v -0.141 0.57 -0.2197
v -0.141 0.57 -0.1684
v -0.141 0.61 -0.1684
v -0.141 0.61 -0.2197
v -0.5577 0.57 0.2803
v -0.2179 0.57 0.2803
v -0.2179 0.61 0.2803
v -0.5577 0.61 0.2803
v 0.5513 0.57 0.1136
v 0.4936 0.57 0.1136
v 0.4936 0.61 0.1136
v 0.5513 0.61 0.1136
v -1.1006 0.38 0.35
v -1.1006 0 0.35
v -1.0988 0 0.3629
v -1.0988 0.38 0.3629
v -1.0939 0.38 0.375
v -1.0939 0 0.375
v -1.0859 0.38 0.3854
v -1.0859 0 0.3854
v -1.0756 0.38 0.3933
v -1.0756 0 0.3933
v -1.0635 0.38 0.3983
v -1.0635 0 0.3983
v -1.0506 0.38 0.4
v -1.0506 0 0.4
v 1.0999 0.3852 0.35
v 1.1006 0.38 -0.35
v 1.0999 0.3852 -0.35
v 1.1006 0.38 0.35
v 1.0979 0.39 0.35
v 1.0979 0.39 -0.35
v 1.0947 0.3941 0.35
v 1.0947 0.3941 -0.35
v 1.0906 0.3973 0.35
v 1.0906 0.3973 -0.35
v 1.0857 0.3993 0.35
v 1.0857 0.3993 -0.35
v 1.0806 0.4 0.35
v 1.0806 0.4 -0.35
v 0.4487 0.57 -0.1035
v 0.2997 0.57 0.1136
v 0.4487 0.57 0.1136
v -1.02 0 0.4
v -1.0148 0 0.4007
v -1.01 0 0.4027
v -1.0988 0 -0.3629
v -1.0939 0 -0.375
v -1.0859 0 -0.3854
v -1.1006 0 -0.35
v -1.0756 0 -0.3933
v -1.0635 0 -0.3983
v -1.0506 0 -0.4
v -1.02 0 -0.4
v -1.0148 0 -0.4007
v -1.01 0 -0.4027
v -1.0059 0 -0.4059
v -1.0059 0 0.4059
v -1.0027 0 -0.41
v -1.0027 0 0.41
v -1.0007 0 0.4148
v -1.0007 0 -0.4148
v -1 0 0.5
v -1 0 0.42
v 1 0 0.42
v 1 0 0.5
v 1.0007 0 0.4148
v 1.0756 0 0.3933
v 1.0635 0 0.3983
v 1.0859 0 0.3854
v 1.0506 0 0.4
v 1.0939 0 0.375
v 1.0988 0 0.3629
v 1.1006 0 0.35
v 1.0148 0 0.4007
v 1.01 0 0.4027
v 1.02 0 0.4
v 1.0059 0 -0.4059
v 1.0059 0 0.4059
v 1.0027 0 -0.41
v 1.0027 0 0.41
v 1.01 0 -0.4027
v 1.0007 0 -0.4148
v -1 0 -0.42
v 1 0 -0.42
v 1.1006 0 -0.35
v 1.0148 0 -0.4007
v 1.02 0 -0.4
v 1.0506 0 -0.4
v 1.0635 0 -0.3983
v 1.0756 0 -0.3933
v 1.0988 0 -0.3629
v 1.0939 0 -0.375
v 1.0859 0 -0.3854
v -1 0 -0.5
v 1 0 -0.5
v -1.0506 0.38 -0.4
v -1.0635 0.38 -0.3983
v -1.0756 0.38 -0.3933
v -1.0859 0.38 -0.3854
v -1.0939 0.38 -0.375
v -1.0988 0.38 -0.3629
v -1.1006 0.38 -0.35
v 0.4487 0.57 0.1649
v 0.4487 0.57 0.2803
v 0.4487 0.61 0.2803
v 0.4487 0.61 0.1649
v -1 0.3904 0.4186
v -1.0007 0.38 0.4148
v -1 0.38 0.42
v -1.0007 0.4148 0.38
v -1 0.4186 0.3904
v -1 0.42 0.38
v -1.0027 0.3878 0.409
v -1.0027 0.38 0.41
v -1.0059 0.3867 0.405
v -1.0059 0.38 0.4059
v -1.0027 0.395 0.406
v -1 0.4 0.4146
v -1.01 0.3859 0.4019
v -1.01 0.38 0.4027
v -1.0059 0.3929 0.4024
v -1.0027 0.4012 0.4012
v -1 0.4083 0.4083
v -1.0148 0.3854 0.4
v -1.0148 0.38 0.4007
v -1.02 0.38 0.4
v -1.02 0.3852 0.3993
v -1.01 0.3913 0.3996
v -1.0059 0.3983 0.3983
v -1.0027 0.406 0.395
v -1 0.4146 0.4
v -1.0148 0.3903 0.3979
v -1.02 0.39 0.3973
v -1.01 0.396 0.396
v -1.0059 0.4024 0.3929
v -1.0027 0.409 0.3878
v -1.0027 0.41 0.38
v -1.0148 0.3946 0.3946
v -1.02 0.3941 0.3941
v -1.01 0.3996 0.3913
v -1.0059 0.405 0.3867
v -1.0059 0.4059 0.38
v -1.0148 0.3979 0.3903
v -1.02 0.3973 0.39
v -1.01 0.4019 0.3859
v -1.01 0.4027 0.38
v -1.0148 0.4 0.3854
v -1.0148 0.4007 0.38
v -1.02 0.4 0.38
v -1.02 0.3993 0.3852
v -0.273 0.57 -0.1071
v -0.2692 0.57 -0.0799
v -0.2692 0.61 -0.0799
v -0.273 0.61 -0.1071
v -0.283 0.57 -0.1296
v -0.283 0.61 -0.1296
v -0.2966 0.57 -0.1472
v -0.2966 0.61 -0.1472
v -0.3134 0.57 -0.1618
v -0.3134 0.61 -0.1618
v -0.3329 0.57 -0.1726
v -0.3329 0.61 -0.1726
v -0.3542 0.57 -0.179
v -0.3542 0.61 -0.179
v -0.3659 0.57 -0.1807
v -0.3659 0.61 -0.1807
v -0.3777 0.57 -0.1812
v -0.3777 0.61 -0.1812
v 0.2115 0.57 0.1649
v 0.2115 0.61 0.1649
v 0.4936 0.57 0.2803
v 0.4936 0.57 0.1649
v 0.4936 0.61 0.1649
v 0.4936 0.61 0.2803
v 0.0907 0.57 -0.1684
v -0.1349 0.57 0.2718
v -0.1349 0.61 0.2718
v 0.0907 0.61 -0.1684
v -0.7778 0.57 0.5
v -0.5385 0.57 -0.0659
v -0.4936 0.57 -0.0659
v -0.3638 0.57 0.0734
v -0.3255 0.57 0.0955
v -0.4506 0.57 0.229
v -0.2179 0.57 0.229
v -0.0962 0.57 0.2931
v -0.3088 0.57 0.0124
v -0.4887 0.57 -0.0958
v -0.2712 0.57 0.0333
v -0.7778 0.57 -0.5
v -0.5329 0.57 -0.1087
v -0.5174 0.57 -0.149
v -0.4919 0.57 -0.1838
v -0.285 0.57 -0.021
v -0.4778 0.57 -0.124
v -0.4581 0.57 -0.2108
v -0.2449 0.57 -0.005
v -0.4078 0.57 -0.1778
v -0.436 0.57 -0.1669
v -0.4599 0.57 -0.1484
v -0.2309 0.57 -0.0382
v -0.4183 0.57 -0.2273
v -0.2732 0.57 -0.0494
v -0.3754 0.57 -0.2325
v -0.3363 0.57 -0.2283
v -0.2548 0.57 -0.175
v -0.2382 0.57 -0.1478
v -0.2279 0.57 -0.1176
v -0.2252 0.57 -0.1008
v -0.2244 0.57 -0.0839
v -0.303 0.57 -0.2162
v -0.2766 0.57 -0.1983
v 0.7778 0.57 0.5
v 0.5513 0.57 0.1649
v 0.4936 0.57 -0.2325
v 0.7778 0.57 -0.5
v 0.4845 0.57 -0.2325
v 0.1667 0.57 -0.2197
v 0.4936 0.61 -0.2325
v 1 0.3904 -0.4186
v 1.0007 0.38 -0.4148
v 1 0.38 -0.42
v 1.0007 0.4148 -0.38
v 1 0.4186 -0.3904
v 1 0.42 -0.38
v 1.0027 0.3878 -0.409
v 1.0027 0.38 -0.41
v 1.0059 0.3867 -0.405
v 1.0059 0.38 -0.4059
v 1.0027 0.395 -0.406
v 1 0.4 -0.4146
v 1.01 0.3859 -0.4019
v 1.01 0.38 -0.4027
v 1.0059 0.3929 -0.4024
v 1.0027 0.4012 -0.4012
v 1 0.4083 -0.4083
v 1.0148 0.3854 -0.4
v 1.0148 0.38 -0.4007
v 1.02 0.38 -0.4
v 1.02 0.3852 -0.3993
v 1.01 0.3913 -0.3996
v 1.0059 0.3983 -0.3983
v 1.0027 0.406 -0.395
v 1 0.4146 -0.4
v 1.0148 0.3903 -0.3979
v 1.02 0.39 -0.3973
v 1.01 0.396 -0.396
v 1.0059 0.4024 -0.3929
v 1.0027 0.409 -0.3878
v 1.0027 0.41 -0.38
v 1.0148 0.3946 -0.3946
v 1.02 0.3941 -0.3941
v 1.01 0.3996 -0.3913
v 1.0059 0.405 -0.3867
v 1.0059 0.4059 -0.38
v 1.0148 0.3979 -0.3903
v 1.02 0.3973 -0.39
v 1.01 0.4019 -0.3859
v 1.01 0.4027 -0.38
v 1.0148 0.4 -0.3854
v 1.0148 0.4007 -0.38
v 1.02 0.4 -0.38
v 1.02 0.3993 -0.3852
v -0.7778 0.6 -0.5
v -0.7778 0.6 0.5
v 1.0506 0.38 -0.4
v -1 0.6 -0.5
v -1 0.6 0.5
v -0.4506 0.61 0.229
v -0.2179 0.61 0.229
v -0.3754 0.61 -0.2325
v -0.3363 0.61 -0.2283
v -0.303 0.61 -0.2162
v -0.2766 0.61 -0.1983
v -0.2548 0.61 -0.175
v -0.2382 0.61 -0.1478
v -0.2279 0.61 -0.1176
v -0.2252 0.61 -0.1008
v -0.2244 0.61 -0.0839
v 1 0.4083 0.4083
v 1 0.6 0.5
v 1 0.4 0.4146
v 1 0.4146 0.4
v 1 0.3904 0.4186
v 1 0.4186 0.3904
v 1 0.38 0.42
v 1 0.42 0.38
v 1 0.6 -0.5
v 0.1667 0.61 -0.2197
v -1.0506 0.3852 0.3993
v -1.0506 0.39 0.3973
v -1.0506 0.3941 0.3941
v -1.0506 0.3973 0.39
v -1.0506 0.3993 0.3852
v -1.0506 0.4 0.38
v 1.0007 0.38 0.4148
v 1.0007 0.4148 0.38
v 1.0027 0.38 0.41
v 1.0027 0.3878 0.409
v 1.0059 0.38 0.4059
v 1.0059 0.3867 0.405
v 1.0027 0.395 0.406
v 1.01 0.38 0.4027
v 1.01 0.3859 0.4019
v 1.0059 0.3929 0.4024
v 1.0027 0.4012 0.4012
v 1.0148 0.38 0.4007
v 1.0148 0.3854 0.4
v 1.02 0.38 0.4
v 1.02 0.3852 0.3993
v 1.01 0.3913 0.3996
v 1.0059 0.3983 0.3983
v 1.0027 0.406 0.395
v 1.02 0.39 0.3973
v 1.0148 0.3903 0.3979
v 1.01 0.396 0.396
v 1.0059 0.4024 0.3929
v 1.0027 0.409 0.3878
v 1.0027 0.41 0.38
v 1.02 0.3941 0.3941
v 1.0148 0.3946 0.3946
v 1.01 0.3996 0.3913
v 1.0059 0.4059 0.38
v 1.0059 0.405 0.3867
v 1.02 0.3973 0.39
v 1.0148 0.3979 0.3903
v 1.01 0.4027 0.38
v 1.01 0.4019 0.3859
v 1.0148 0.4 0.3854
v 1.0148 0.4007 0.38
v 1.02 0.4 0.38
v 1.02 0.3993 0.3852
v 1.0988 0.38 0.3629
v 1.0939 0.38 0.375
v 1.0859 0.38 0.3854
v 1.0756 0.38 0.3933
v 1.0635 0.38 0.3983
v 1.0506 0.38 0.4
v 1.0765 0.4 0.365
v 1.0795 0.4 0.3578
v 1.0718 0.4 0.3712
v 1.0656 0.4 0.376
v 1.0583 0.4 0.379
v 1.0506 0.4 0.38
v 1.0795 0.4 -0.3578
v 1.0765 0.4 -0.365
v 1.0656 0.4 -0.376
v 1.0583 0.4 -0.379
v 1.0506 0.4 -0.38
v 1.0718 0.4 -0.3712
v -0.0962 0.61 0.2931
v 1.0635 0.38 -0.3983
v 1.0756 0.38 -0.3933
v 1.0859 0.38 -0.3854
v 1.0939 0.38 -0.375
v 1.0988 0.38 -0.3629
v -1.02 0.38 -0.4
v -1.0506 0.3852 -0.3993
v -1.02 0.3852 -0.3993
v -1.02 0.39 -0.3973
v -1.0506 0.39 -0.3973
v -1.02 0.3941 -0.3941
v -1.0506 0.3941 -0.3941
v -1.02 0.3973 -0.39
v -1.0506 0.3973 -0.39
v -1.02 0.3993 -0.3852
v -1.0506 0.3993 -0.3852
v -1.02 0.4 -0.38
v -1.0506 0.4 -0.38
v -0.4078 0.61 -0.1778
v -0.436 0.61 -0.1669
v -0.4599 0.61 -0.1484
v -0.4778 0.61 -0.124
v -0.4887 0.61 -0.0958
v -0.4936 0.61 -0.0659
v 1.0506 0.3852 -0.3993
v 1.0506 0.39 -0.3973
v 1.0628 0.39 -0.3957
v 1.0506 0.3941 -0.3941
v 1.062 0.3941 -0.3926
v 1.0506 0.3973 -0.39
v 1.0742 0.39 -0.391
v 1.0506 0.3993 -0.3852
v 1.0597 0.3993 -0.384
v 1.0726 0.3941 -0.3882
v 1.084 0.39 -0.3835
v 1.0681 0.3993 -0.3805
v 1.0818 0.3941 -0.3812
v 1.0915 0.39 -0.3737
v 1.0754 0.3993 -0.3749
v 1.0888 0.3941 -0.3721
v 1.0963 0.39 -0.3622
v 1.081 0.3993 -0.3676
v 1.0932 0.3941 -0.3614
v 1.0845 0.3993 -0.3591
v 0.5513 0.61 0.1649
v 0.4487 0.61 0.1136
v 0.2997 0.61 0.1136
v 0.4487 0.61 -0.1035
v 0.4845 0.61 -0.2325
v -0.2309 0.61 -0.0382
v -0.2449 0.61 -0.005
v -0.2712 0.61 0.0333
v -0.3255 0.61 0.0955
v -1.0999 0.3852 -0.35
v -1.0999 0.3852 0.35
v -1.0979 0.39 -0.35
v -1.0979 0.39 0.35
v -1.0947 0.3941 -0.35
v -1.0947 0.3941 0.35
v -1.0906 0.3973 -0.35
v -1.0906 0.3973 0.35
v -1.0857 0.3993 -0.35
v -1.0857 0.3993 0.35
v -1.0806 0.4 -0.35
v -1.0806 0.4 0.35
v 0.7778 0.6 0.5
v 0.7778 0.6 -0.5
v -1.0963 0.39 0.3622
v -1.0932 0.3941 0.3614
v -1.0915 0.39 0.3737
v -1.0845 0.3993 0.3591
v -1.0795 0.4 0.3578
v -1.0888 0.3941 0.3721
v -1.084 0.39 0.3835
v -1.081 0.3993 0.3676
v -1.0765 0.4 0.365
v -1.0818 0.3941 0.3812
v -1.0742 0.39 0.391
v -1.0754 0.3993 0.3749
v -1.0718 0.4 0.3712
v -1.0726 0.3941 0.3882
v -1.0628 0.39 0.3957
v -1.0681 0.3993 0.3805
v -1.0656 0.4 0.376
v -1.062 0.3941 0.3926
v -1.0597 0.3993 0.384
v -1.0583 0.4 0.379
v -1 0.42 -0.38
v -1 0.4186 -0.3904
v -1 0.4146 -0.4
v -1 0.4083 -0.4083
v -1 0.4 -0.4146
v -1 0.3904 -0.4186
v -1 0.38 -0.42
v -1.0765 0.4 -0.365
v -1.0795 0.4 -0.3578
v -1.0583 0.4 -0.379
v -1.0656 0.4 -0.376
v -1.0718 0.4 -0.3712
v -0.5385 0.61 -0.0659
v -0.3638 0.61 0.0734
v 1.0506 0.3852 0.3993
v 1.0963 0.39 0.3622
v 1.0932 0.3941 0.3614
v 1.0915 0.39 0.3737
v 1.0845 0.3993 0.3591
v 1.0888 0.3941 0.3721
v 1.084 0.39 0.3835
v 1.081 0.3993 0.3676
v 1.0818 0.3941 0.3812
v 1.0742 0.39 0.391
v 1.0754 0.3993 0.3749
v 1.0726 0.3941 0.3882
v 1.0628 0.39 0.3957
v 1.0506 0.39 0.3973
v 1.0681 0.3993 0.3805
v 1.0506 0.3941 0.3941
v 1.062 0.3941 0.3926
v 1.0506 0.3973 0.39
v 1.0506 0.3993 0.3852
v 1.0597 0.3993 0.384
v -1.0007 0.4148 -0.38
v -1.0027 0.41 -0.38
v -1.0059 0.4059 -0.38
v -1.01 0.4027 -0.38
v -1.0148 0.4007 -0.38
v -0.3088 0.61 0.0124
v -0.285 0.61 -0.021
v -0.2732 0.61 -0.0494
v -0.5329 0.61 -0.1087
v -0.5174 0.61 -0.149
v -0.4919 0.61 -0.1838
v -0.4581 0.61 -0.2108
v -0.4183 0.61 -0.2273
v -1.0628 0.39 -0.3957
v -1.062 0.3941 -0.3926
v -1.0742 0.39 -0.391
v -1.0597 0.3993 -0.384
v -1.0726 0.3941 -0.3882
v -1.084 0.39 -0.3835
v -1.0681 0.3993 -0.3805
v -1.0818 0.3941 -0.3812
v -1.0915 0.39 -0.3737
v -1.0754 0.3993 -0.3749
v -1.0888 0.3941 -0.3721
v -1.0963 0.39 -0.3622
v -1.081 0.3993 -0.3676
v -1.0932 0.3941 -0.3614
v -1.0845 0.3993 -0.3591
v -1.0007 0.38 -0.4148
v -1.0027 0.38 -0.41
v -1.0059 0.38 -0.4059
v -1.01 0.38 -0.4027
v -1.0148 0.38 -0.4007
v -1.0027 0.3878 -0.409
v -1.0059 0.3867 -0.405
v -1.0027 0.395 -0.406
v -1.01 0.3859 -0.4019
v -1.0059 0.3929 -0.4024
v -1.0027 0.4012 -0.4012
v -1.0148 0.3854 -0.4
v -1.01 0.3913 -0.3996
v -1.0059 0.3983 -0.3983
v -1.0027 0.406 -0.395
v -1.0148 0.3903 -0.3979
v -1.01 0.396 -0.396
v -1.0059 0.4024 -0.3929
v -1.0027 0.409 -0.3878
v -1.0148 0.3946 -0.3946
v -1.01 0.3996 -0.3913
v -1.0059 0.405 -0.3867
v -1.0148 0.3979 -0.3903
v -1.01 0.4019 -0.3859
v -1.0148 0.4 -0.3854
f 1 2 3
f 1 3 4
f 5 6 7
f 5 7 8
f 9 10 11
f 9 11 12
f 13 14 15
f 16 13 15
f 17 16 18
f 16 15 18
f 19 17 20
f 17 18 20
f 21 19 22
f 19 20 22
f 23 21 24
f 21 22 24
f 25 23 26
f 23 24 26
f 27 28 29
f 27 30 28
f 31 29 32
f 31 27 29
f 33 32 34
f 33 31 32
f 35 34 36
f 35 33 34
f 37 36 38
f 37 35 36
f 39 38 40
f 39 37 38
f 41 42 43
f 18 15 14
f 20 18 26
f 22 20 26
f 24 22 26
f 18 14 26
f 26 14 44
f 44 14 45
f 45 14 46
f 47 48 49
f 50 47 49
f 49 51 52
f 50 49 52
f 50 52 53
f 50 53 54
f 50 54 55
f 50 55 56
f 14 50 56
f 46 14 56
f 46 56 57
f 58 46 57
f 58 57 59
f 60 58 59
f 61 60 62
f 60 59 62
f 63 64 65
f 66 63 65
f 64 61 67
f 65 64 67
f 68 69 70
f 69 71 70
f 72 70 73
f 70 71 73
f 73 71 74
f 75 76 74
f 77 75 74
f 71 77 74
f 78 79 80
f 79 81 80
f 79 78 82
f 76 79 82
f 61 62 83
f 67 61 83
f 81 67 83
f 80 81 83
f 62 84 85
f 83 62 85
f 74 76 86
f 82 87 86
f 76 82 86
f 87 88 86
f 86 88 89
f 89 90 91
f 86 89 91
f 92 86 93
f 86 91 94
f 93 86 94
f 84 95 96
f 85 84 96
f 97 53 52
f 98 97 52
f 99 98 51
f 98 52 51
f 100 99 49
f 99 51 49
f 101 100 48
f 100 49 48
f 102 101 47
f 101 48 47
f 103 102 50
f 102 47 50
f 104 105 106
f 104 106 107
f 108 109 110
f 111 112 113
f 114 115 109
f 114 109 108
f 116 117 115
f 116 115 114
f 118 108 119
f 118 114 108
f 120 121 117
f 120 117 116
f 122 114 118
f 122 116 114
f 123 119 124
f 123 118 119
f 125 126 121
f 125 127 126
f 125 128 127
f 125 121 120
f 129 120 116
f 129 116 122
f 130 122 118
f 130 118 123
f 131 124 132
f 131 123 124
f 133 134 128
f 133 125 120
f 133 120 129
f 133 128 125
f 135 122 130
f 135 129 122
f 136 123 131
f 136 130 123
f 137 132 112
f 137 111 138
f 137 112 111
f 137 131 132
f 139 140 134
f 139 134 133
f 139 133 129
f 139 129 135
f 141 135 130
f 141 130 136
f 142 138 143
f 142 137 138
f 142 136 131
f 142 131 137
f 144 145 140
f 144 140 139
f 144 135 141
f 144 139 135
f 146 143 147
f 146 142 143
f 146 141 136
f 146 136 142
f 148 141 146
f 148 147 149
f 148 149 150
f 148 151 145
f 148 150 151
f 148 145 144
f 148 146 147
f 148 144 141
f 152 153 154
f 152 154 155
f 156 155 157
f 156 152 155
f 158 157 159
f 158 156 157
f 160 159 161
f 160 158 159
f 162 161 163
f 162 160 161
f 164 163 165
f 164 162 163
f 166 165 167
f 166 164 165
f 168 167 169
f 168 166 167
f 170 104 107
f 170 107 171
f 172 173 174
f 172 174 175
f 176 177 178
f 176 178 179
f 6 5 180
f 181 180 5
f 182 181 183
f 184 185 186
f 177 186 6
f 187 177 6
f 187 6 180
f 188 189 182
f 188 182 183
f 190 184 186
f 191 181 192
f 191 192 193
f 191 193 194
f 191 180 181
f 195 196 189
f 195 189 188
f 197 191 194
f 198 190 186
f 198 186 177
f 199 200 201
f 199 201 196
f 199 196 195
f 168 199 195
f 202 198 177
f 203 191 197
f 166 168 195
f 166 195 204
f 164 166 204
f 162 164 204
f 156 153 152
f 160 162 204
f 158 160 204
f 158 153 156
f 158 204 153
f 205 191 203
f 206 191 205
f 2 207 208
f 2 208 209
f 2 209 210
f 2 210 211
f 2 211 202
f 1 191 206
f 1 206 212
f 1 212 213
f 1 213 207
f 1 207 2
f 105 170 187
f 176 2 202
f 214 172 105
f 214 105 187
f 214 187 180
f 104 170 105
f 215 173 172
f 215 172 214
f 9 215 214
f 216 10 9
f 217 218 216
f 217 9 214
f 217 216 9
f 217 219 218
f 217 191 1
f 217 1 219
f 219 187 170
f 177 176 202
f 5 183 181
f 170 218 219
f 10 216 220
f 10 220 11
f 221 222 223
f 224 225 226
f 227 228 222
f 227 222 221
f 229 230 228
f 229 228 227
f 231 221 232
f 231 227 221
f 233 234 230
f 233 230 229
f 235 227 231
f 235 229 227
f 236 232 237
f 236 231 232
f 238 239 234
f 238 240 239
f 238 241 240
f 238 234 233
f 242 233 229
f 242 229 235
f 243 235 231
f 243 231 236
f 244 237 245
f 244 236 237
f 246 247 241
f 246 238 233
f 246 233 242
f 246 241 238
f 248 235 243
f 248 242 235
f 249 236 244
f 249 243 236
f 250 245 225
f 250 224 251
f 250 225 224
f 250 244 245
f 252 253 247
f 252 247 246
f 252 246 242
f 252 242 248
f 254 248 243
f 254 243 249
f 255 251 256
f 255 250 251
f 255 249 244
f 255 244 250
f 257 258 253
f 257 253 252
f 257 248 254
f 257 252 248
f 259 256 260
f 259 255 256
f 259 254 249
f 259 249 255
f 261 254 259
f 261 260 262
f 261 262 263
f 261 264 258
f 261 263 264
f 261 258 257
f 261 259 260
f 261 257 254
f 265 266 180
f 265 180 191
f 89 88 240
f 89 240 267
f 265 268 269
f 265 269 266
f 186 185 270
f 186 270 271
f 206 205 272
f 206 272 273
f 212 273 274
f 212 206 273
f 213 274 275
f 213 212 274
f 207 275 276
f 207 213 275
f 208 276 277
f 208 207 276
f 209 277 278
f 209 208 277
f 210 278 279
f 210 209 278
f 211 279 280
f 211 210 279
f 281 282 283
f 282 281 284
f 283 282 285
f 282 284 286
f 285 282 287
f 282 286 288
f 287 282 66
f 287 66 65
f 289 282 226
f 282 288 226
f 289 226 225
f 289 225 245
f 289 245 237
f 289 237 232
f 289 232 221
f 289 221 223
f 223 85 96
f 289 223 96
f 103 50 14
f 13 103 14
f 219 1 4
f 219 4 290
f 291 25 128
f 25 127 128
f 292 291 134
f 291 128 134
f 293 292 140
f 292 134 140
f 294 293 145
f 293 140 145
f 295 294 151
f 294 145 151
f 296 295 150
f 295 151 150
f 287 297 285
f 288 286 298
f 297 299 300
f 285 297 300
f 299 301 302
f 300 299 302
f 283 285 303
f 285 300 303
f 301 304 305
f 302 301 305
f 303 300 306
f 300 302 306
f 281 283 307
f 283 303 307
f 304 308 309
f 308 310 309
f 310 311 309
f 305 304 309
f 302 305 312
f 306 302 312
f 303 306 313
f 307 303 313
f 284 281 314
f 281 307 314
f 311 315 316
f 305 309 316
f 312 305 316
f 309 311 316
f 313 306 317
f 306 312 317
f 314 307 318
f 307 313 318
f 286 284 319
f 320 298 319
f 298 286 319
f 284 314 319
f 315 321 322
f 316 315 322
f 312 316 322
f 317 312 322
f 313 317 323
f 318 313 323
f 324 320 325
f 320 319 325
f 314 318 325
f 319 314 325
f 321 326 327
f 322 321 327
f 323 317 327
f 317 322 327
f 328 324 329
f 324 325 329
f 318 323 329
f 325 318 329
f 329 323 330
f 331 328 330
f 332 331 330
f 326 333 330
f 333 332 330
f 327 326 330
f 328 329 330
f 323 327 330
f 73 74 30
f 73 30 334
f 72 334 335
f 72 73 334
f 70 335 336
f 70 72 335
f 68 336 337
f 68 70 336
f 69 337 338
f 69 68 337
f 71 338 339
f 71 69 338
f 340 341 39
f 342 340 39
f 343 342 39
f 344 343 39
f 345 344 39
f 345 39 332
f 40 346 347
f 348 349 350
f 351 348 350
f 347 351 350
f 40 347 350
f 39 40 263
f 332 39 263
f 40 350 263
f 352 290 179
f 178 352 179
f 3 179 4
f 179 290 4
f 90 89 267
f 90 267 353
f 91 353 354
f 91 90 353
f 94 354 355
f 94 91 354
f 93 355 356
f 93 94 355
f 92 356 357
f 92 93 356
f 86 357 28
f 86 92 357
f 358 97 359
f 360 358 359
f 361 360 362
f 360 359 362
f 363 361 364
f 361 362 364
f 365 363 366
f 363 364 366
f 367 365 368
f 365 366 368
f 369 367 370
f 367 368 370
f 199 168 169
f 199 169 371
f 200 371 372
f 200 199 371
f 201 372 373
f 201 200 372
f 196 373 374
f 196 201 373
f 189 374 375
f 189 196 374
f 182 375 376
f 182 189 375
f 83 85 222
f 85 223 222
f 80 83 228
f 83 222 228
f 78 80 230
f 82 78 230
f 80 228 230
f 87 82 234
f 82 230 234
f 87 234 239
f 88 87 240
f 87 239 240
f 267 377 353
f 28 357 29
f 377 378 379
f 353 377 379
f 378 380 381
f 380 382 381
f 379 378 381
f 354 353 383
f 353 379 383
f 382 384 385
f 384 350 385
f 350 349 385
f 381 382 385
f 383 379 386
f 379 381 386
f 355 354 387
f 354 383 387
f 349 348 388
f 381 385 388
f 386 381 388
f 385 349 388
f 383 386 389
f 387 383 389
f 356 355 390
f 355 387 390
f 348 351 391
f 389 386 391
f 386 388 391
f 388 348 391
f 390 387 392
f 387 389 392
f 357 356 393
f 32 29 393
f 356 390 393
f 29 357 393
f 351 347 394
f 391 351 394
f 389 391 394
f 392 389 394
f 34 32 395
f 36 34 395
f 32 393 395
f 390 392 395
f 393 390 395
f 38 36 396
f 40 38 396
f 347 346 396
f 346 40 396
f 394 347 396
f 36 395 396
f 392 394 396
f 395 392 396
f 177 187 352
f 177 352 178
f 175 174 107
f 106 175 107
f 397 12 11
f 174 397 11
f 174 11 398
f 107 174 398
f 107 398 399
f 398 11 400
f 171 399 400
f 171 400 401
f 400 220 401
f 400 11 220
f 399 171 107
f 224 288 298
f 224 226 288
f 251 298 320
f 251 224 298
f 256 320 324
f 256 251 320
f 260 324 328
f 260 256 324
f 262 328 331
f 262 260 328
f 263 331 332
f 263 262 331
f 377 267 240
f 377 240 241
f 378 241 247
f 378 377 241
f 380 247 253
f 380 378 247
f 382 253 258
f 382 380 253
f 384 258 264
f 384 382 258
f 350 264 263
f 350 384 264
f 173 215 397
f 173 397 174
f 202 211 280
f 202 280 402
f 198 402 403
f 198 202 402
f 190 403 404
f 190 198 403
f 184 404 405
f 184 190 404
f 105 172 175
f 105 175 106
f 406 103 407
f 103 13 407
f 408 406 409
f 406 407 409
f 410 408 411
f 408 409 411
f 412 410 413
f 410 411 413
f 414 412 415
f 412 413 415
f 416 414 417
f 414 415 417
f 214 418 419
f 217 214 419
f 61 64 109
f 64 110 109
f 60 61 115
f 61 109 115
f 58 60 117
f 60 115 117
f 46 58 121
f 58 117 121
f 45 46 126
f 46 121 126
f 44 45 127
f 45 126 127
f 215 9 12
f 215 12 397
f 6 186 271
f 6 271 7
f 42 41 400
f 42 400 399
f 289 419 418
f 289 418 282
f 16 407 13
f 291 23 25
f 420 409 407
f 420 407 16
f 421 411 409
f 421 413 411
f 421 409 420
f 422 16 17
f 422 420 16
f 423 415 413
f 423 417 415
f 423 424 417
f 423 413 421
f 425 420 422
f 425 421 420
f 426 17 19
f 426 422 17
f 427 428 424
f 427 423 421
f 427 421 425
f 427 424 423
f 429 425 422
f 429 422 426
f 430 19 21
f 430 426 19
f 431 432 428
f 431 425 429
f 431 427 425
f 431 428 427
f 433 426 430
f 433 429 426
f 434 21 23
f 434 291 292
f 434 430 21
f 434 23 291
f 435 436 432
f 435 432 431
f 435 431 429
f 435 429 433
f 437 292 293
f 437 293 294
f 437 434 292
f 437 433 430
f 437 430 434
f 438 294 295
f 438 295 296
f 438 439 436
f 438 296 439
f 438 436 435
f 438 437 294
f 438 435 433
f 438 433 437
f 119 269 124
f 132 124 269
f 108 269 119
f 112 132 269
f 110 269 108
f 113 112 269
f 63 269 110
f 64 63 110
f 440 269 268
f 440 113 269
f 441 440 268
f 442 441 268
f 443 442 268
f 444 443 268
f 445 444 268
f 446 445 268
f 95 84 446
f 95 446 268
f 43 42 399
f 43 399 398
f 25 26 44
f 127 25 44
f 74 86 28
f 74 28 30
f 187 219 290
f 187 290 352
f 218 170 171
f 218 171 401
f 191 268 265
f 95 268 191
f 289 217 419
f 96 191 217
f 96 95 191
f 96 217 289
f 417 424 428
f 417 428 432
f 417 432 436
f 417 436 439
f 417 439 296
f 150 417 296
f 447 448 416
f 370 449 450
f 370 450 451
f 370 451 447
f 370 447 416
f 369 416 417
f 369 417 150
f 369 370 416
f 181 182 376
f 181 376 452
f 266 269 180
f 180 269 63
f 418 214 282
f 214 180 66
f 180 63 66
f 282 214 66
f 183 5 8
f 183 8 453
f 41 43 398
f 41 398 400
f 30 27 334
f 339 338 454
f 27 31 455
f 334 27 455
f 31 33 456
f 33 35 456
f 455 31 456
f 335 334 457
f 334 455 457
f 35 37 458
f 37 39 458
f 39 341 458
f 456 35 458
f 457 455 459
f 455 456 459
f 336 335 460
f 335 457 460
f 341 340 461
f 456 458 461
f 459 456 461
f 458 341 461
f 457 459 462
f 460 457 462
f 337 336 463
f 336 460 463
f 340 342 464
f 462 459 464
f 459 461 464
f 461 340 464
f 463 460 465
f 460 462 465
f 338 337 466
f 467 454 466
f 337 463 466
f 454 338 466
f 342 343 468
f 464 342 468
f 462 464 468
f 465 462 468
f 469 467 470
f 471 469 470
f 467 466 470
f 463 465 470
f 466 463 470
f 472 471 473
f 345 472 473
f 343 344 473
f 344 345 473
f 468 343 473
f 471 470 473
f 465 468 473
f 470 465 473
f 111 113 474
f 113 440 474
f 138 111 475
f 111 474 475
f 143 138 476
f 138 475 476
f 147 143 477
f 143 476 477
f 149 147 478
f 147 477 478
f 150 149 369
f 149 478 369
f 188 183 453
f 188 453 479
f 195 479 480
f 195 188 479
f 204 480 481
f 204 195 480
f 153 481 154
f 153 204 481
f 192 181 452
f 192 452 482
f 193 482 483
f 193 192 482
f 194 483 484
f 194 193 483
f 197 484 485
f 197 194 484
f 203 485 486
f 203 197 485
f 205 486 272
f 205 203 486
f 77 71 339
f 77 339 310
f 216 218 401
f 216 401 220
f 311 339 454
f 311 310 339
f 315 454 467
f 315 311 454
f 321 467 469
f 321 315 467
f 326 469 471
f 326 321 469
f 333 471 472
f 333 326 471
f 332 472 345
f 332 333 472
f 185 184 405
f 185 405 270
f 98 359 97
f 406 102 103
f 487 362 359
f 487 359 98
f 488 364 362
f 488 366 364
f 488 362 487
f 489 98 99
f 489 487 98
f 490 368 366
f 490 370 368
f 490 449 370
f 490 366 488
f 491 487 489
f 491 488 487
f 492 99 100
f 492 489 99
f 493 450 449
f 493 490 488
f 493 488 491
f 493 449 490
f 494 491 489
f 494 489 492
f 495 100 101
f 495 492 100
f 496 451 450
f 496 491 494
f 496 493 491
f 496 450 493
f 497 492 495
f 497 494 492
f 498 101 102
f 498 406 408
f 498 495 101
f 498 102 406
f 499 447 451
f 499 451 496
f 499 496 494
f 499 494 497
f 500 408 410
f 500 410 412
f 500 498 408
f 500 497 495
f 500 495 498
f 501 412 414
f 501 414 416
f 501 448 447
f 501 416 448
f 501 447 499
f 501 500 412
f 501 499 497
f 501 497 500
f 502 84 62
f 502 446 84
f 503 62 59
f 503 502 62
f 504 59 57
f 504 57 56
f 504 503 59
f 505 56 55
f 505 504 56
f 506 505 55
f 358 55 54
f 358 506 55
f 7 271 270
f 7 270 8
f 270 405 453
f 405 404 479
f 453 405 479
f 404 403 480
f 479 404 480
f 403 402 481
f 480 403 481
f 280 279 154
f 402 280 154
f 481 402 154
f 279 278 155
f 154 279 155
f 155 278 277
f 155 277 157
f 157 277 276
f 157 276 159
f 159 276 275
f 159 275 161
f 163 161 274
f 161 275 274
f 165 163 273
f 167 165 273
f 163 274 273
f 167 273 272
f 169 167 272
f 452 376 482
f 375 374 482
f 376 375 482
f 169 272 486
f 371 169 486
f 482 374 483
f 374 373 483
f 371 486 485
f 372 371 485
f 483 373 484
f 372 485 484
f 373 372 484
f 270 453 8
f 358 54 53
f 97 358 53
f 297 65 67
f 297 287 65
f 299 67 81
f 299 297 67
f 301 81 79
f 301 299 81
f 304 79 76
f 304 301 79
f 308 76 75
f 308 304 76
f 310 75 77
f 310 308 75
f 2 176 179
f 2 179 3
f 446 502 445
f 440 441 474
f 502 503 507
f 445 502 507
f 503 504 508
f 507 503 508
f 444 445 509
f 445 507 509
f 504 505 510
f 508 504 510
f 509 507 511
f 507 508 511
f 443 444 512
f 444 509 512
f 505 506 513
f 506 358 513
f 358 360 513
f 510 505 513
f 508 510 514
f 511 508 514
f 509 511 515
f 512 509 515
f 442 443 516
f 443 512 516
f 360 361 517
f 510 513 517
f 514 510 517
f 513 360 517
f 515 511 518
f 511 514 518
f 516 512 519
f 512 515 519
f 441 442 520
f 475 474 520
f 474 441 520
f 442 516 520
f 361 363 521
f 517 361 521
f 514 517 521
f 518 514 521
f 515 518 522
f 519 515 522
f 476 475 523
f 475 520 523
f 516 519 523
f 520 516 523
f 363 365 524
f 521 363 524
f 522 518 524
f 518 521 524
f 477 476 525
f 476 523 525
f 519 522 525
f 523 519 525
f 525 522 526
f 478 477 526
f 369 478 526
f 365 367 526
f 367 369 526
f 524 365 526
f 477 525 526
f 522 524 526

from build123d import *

# Parameters (mm, degrees)
ESQUISSE1_W             = 2
ESQUISSE1_H             = 1
BOSS_EXTRU_1_DEPTH      = 0.6
ESQUISSE2_W             = 1.555645222
ESQUISSE2_H             = 1
ENL_V_MAT_EXTRU_1_DEPTH = 0.03
BOSS_EXTRU_2_DEPTH      = 0.4
CONG_1_R                = 0.02
CONG_1_OF_SYM_TRIE2_R   = 0.02
BOSS_EXTRU_3_DEPTH      = 0.04


with BuildPart() as part:
    # Esquisse1 → Boss.-Extru.1 (new body)
    with BuildSketch(Plane(origin=(0, 0, 0), x_dir=(1, 0, 0), z_dir=(0, 1, 0))):
        Rectangle(ESQUISSE1_W, ESQUISSE1_H)
    extrude(amount=BOSS_EXTRU_1_DEPTH)

    # Esquisse2 → Enlèv. mat.-Extru.1 (cut)
    with BuildSketch(Plane(origin=(0, 0.6, 0), x_dir=(1, 0, 0), z_dir=(0, 1, 0))):
        Rectangle(ESQUISSE2_W, ESQUISSE2_H)
    extrude(amount=-ENL_V_MAT_EXTRU_1_DEPTH, mode=Mode.SUBTRACT)

    # Esquisse3 → Boss.-Extru.2 (add)
    with BuildSketch(Plane(origin=(0, 0, 0), x_dir=(1, 0, 0), z_dir=(0, 1, 0))):
        with BuildLine():
            Line((1, 0.4), (1.050552667, 0.4))
            ThreePointArc((1.050552667, 0.4), (1.085908006, 0.385355339), (1.100552667, 0.35))
            Line((1.100552667, 0.35), (1.100552667, -0.35))
            ThreePointArc((1.100552667, -0.35), (1.085908006, -0.385355339), (1.050552667, -0.4))
            Line((1.050552667, -0.4), (1, -0.4))
            Line((1, -0.4), (1, 0.4))
        make_face()
    boss_extru_2 = extrude(amount=BOSS_EXTRU_2_DEPTH)

    # Congé1
    cong_1_edges = [part.edges().sort_by_distance(p)[0] for p in [
        (1, 0.2, -0.4),
        (1, 0.2, 0.4),
        (1, 0.4, 0),
        (1.025276334, 0.4, 0.4),
        (1.085908006, 0.4, 0.385355339),
        (1.100552667, 0.4, 0),
        (1.085908006, 0.4, -0.385355339),
        (1.025276334, 0.4, -0.4),
    ]]
    fillet(cong_1_edges, radius=CONG_1_R)

    # Symétrie2: Boss.-Extru.2 across plane
    add(boss_extru_2.mirror(Plane(origin=(0, 0, 0), x_dir=(0, 0, 1), z_dir=(1, 0, 0))))

    # Congé1 of Symétrie2
    cong_1_of_sym_trie2_edges = [part.edges().sort_by_distance(p)[0] for p in [
        (-1, 0.2, -0.4),
        (-1, 0.2, 0.4),
        (-1, 0.4, 0),
        (-1.025276334, 0.4, 0.4),
        (-1.085908006, 0.4, 0.385355339),
        (-1.100552667, 0.4, 0),
        (-1.085908006, 0.4, -0.385355339),
        (-1.025276334, 0.4, -0.4),
    ]]
    fillet(cong_1_of_sym_trie2_edges, radius=CONG_1_OF_SYM_TRIE2_R)

    # Esquisse4 → Boss.-Extru.3 (add)
    with BuildSketch(Plane(origin=(0, 0.57, 0), x_dir=(1, 0, 0), z_dir=(0, 1, 0))):
        Polygon((0.48447516, 0.23252099), (0.493589744, 0.23252099), (0.493589744, -0.113632856), (0.551282051, -0.113632856), (0.551282051, -0.164914907), (0.493589744, -0.164914907), (0.493589744, -0.280299523), (0.448717949, -0.280299523), (0.448717949, -0.164914907), (0.211538462, -0.164914907), align=None)
        Polygon((0.448717949, -0.113632856), (0.448717949, 0.10351458), (0.299679487, -0.113632856), align=None, mode=Mode.SUBTRACT)
        Polygon((-0.141025641, 0.219700477), (0.166666667, 0.219700477), (-0.096153846, -0.293120035), (-0.134915865, -0.271785901), (0.090745192, 0.168418426), (-0.141025641, 0.168418426), align=None)
        with BuildLine():
            Line((-0.493589744, 0.065854324), (-0.538461538, 0.065854324))
            add(Edge.make_bspline(
                [(-0.538461538, 0.065854324), (-0.538169088, 0.071807307), (-0.537594723, 0.08349881), (-0.534904968, 0.100545082), (-0.531056271, 0.116838625), (-0.525614635, 0.132248612), (-0.518856595, 0.146911299), (-0.510752305, 0.160768444), (-0.501153184, 0.173767185), (-0.490266507, 0.18578702), (-0.478442416, 0.196813816), (-0.465684425, 0.206335994), (-0.452277992, 0.214381375), (-0.438263792, 0.221107267), (-0.423483712, 0.226155816), (-0.408071875, 0.229901765), (-0.39196057, 0.232155528), (-0.380983424, 0.232397784), (-0.375400641, 0.23252099)],
                knots=[0, 0, 0, 0, 1.7869e-05, 3.5094e-05, 5.1686e-05, 6.8032e-05, 8.4031e-05, 0.000100058, 0.000116104, 0.000132416, 0.000148647, 0.000164532, 0.000180078, 0.00019549, 0.000211074, 0.000226841, 0.000243017, 0.000259759, 0.000259759, 0.000259759, 0.000259759], degree=3))
            add(Edge.make_bspline(
                [(-0.375400641, 0.23252099), (-0.369918059, 0.232392639), (-0.359144981, 0.232140434), (-0.343421836, 0.229974573), (-0.328453651, 0.226582346), (-0.314269685, 0.221823), (-0.300983104, 0.215425225), (-0.288494098, 0.207739862), (-0.276653982, 0.198851315), (-0.26599587, 0.188386485), (-0.256209001, 0.177214715), (-0.247765822, 0.165287872), (-0.24053537, 0.152969403), (-0.234508559, 0.140165374), (-0.230071968, 0.126755227), (-0.226703652, 0.112934198), (-0.224799736, 0.098559225), (-0.224507533, 0.088829717), (-0.224358974, 0.08388317)],
                knots=[0, 0, 0, 0, 1.6441e-05, 3.2306e-05, 4.7516e-05, 6.2435e-05, 7.7085e-05, 9.1652e-05, 0.000106376, 0.000121393, 0.000136374, 0.000150882, 0.000165157, 0.000179183, 0.000193247, 0.000207458, 0.000221808, 0.000236648, 0.000236648, 0.000236648, 0.000236648], degree=3))
            add(Edge.make_bspline(
                [(-0.224358974, 0.08388317), (-0.224600869, 0.076919193), (-0.225080414, 0.063113449), (-0.229182467, 0.042825611), (-0.235589112, 0.023169408), (-0.24330302, 0.007349794), (-0.251084798, -0.005397848), (-0.258097299, -0.015893378), (-0.266306557, -0.027194159), (-0.275832057, -0.03926235), (-0.286476753, -0.052192479), (-0.298337062, -0.065976736), (-0.31149756, -0.080472703), (-0.320734488, -0.090373503), (-0.325520833, -0.09550385)],
                knots=[0, 0, 0, 0, 2.0874e-05, 4.1382e-05, 6.1843e-05, 8.2763e-05, 9.3997e-05, 0.000106637, 0.000120621, 0.000135888, 0.000152753, 0.000170863, 0.000190435, 0.000211484, 0.000211484, 0.000211484, 0.000211484], degree=3))
            Line((-0.325520833, -0.09550385), (-0.450620994, -0.229017471))
            Line((-0.450620994, -0.229017471), (-0.217948718, -0.229017471))
            Line((-0.217948718, -0.229017471), (-0.217948718, -0.280299523))
            Line((-0.217948718, -0.280299523), (-0.557692308, -0.280299523))
            Line((-0.557692308, -0.280299523), (-0.363782051, -0.073368433))
            add(Edge.make_bspline(
                [(-0.363782051, -0.073368433), (-0.359060925, -0.068440103), (-0.349992606, -0.058973791), (-0.337166524, -0.045153368), (-0.325646669, -0.032332005), (-0.31535847, -0.020533927), (-0.306525112, -0.00958656), (-0.298686221, 0.000155541), (-0.292405423, 0.009120462), (-0.285588938, 0.019511978), (-0.27898694, 0.032199452), (-0.273313747, 0.047704265), (-0.269854482, 0.063665301), (-0.269439506, 0.074451306), (-0.269230769, 0.079876759)],
                knots=[0, 0, 0, 0, 2.0474e-05, 3.9327e-05, 5.6561e-05, 7.2184e-05, 8.6278e-05, 9.8762e-05, 0.000109683, 0.000119101, 0.000136035, 0.000152448, 0.000168517, 0.00018478, 0.00018478, 0.00018478, 0.00018478], degree=3))
            add(Edge.make_bspline(
                [(-0.269230769, 0.079876759), (-0.26932159, 0.083288388), (-0.269500579, 0.090012052), (-0.27108025, 0.099870018), (-0.273467465, 0.109379277), (-0.276888216, 0.11856908), (-0.281403465, 0.12734703), (-0.286899662, 0.135723813), (-0.2932411, 0.143822236), (-0.300576995, 0.151415565), (-0.308635784, 0.158370023), (-0.317149248, 0.164530606), (-0.326156406, 0.169679051), (-0.33561928, 0.17389955), (-0.34551149, 0.177210319), (-0.355852168, 0.179504402), (-0.366612742, 0.180944757), (-0.373960384, 0.181139638), (-0.377704327, 0.181238939)],
                knots=[0, 0, 0, 0, 1.0229e-05, 2.0159e-05, 2.9876e-05, 3.9606e-05, 4.9505e-05, 5.9423e-05, 6.9622e-05, 8.0319e-05, 9.1042e-05, 0.000101521, 0.000111795, 0.000122107, 0.000132559, 0.000143032, 0.000153841, 0.00016507, 0.00016507, 0.00016507, 0.00016507], degree=3))
            add(Edge.make_bspline(
                [(-0.377704327, 0.181238939), (-0.381614446, 0.181136791), (-0.389293274, 0.180936191), (-0.400567421, 0.179532953), (-0.411322533, 0.177112119), (-0.421585662, 0.173801165), (-0.431374174, 0.169592801), (-0.440640466, 0.164351123), (-0.449363736, 0.158096338), (-0.457560382, 0.15100483), (-0.465112379, 0.143109459), (-0.471747647, 0.134308036), (-0.477545363, 0.124761262), (-0.482603825, 0.114494898), (-0.486711781, 0.103415786), (-0.489850802, 0.091563257), (-0.492334638, 0.078988774), (-0.493164426, 0.07030519), (-0.493589744, 0.065854324)],
                knots=[0, 0, 0, 0, 1.1729e-05, 2.3035e-05, 3.4018e-05, 4.4756e-05, 5.5343e-05, 6.5928e-05, 7.6628e-05, 8.7492e-05, 9.8403e-05, 0.00010934, 0.000120489, 0.000131867, 0.000143625, 0.00015587, 0.000168619, 0.000182025, 0.000182025, 0.000182025, 0.000182025], degree=3))
        make_face()
    extrude(amount=BOSS_EXTRU_3_DEPTH)


solid = part.part
